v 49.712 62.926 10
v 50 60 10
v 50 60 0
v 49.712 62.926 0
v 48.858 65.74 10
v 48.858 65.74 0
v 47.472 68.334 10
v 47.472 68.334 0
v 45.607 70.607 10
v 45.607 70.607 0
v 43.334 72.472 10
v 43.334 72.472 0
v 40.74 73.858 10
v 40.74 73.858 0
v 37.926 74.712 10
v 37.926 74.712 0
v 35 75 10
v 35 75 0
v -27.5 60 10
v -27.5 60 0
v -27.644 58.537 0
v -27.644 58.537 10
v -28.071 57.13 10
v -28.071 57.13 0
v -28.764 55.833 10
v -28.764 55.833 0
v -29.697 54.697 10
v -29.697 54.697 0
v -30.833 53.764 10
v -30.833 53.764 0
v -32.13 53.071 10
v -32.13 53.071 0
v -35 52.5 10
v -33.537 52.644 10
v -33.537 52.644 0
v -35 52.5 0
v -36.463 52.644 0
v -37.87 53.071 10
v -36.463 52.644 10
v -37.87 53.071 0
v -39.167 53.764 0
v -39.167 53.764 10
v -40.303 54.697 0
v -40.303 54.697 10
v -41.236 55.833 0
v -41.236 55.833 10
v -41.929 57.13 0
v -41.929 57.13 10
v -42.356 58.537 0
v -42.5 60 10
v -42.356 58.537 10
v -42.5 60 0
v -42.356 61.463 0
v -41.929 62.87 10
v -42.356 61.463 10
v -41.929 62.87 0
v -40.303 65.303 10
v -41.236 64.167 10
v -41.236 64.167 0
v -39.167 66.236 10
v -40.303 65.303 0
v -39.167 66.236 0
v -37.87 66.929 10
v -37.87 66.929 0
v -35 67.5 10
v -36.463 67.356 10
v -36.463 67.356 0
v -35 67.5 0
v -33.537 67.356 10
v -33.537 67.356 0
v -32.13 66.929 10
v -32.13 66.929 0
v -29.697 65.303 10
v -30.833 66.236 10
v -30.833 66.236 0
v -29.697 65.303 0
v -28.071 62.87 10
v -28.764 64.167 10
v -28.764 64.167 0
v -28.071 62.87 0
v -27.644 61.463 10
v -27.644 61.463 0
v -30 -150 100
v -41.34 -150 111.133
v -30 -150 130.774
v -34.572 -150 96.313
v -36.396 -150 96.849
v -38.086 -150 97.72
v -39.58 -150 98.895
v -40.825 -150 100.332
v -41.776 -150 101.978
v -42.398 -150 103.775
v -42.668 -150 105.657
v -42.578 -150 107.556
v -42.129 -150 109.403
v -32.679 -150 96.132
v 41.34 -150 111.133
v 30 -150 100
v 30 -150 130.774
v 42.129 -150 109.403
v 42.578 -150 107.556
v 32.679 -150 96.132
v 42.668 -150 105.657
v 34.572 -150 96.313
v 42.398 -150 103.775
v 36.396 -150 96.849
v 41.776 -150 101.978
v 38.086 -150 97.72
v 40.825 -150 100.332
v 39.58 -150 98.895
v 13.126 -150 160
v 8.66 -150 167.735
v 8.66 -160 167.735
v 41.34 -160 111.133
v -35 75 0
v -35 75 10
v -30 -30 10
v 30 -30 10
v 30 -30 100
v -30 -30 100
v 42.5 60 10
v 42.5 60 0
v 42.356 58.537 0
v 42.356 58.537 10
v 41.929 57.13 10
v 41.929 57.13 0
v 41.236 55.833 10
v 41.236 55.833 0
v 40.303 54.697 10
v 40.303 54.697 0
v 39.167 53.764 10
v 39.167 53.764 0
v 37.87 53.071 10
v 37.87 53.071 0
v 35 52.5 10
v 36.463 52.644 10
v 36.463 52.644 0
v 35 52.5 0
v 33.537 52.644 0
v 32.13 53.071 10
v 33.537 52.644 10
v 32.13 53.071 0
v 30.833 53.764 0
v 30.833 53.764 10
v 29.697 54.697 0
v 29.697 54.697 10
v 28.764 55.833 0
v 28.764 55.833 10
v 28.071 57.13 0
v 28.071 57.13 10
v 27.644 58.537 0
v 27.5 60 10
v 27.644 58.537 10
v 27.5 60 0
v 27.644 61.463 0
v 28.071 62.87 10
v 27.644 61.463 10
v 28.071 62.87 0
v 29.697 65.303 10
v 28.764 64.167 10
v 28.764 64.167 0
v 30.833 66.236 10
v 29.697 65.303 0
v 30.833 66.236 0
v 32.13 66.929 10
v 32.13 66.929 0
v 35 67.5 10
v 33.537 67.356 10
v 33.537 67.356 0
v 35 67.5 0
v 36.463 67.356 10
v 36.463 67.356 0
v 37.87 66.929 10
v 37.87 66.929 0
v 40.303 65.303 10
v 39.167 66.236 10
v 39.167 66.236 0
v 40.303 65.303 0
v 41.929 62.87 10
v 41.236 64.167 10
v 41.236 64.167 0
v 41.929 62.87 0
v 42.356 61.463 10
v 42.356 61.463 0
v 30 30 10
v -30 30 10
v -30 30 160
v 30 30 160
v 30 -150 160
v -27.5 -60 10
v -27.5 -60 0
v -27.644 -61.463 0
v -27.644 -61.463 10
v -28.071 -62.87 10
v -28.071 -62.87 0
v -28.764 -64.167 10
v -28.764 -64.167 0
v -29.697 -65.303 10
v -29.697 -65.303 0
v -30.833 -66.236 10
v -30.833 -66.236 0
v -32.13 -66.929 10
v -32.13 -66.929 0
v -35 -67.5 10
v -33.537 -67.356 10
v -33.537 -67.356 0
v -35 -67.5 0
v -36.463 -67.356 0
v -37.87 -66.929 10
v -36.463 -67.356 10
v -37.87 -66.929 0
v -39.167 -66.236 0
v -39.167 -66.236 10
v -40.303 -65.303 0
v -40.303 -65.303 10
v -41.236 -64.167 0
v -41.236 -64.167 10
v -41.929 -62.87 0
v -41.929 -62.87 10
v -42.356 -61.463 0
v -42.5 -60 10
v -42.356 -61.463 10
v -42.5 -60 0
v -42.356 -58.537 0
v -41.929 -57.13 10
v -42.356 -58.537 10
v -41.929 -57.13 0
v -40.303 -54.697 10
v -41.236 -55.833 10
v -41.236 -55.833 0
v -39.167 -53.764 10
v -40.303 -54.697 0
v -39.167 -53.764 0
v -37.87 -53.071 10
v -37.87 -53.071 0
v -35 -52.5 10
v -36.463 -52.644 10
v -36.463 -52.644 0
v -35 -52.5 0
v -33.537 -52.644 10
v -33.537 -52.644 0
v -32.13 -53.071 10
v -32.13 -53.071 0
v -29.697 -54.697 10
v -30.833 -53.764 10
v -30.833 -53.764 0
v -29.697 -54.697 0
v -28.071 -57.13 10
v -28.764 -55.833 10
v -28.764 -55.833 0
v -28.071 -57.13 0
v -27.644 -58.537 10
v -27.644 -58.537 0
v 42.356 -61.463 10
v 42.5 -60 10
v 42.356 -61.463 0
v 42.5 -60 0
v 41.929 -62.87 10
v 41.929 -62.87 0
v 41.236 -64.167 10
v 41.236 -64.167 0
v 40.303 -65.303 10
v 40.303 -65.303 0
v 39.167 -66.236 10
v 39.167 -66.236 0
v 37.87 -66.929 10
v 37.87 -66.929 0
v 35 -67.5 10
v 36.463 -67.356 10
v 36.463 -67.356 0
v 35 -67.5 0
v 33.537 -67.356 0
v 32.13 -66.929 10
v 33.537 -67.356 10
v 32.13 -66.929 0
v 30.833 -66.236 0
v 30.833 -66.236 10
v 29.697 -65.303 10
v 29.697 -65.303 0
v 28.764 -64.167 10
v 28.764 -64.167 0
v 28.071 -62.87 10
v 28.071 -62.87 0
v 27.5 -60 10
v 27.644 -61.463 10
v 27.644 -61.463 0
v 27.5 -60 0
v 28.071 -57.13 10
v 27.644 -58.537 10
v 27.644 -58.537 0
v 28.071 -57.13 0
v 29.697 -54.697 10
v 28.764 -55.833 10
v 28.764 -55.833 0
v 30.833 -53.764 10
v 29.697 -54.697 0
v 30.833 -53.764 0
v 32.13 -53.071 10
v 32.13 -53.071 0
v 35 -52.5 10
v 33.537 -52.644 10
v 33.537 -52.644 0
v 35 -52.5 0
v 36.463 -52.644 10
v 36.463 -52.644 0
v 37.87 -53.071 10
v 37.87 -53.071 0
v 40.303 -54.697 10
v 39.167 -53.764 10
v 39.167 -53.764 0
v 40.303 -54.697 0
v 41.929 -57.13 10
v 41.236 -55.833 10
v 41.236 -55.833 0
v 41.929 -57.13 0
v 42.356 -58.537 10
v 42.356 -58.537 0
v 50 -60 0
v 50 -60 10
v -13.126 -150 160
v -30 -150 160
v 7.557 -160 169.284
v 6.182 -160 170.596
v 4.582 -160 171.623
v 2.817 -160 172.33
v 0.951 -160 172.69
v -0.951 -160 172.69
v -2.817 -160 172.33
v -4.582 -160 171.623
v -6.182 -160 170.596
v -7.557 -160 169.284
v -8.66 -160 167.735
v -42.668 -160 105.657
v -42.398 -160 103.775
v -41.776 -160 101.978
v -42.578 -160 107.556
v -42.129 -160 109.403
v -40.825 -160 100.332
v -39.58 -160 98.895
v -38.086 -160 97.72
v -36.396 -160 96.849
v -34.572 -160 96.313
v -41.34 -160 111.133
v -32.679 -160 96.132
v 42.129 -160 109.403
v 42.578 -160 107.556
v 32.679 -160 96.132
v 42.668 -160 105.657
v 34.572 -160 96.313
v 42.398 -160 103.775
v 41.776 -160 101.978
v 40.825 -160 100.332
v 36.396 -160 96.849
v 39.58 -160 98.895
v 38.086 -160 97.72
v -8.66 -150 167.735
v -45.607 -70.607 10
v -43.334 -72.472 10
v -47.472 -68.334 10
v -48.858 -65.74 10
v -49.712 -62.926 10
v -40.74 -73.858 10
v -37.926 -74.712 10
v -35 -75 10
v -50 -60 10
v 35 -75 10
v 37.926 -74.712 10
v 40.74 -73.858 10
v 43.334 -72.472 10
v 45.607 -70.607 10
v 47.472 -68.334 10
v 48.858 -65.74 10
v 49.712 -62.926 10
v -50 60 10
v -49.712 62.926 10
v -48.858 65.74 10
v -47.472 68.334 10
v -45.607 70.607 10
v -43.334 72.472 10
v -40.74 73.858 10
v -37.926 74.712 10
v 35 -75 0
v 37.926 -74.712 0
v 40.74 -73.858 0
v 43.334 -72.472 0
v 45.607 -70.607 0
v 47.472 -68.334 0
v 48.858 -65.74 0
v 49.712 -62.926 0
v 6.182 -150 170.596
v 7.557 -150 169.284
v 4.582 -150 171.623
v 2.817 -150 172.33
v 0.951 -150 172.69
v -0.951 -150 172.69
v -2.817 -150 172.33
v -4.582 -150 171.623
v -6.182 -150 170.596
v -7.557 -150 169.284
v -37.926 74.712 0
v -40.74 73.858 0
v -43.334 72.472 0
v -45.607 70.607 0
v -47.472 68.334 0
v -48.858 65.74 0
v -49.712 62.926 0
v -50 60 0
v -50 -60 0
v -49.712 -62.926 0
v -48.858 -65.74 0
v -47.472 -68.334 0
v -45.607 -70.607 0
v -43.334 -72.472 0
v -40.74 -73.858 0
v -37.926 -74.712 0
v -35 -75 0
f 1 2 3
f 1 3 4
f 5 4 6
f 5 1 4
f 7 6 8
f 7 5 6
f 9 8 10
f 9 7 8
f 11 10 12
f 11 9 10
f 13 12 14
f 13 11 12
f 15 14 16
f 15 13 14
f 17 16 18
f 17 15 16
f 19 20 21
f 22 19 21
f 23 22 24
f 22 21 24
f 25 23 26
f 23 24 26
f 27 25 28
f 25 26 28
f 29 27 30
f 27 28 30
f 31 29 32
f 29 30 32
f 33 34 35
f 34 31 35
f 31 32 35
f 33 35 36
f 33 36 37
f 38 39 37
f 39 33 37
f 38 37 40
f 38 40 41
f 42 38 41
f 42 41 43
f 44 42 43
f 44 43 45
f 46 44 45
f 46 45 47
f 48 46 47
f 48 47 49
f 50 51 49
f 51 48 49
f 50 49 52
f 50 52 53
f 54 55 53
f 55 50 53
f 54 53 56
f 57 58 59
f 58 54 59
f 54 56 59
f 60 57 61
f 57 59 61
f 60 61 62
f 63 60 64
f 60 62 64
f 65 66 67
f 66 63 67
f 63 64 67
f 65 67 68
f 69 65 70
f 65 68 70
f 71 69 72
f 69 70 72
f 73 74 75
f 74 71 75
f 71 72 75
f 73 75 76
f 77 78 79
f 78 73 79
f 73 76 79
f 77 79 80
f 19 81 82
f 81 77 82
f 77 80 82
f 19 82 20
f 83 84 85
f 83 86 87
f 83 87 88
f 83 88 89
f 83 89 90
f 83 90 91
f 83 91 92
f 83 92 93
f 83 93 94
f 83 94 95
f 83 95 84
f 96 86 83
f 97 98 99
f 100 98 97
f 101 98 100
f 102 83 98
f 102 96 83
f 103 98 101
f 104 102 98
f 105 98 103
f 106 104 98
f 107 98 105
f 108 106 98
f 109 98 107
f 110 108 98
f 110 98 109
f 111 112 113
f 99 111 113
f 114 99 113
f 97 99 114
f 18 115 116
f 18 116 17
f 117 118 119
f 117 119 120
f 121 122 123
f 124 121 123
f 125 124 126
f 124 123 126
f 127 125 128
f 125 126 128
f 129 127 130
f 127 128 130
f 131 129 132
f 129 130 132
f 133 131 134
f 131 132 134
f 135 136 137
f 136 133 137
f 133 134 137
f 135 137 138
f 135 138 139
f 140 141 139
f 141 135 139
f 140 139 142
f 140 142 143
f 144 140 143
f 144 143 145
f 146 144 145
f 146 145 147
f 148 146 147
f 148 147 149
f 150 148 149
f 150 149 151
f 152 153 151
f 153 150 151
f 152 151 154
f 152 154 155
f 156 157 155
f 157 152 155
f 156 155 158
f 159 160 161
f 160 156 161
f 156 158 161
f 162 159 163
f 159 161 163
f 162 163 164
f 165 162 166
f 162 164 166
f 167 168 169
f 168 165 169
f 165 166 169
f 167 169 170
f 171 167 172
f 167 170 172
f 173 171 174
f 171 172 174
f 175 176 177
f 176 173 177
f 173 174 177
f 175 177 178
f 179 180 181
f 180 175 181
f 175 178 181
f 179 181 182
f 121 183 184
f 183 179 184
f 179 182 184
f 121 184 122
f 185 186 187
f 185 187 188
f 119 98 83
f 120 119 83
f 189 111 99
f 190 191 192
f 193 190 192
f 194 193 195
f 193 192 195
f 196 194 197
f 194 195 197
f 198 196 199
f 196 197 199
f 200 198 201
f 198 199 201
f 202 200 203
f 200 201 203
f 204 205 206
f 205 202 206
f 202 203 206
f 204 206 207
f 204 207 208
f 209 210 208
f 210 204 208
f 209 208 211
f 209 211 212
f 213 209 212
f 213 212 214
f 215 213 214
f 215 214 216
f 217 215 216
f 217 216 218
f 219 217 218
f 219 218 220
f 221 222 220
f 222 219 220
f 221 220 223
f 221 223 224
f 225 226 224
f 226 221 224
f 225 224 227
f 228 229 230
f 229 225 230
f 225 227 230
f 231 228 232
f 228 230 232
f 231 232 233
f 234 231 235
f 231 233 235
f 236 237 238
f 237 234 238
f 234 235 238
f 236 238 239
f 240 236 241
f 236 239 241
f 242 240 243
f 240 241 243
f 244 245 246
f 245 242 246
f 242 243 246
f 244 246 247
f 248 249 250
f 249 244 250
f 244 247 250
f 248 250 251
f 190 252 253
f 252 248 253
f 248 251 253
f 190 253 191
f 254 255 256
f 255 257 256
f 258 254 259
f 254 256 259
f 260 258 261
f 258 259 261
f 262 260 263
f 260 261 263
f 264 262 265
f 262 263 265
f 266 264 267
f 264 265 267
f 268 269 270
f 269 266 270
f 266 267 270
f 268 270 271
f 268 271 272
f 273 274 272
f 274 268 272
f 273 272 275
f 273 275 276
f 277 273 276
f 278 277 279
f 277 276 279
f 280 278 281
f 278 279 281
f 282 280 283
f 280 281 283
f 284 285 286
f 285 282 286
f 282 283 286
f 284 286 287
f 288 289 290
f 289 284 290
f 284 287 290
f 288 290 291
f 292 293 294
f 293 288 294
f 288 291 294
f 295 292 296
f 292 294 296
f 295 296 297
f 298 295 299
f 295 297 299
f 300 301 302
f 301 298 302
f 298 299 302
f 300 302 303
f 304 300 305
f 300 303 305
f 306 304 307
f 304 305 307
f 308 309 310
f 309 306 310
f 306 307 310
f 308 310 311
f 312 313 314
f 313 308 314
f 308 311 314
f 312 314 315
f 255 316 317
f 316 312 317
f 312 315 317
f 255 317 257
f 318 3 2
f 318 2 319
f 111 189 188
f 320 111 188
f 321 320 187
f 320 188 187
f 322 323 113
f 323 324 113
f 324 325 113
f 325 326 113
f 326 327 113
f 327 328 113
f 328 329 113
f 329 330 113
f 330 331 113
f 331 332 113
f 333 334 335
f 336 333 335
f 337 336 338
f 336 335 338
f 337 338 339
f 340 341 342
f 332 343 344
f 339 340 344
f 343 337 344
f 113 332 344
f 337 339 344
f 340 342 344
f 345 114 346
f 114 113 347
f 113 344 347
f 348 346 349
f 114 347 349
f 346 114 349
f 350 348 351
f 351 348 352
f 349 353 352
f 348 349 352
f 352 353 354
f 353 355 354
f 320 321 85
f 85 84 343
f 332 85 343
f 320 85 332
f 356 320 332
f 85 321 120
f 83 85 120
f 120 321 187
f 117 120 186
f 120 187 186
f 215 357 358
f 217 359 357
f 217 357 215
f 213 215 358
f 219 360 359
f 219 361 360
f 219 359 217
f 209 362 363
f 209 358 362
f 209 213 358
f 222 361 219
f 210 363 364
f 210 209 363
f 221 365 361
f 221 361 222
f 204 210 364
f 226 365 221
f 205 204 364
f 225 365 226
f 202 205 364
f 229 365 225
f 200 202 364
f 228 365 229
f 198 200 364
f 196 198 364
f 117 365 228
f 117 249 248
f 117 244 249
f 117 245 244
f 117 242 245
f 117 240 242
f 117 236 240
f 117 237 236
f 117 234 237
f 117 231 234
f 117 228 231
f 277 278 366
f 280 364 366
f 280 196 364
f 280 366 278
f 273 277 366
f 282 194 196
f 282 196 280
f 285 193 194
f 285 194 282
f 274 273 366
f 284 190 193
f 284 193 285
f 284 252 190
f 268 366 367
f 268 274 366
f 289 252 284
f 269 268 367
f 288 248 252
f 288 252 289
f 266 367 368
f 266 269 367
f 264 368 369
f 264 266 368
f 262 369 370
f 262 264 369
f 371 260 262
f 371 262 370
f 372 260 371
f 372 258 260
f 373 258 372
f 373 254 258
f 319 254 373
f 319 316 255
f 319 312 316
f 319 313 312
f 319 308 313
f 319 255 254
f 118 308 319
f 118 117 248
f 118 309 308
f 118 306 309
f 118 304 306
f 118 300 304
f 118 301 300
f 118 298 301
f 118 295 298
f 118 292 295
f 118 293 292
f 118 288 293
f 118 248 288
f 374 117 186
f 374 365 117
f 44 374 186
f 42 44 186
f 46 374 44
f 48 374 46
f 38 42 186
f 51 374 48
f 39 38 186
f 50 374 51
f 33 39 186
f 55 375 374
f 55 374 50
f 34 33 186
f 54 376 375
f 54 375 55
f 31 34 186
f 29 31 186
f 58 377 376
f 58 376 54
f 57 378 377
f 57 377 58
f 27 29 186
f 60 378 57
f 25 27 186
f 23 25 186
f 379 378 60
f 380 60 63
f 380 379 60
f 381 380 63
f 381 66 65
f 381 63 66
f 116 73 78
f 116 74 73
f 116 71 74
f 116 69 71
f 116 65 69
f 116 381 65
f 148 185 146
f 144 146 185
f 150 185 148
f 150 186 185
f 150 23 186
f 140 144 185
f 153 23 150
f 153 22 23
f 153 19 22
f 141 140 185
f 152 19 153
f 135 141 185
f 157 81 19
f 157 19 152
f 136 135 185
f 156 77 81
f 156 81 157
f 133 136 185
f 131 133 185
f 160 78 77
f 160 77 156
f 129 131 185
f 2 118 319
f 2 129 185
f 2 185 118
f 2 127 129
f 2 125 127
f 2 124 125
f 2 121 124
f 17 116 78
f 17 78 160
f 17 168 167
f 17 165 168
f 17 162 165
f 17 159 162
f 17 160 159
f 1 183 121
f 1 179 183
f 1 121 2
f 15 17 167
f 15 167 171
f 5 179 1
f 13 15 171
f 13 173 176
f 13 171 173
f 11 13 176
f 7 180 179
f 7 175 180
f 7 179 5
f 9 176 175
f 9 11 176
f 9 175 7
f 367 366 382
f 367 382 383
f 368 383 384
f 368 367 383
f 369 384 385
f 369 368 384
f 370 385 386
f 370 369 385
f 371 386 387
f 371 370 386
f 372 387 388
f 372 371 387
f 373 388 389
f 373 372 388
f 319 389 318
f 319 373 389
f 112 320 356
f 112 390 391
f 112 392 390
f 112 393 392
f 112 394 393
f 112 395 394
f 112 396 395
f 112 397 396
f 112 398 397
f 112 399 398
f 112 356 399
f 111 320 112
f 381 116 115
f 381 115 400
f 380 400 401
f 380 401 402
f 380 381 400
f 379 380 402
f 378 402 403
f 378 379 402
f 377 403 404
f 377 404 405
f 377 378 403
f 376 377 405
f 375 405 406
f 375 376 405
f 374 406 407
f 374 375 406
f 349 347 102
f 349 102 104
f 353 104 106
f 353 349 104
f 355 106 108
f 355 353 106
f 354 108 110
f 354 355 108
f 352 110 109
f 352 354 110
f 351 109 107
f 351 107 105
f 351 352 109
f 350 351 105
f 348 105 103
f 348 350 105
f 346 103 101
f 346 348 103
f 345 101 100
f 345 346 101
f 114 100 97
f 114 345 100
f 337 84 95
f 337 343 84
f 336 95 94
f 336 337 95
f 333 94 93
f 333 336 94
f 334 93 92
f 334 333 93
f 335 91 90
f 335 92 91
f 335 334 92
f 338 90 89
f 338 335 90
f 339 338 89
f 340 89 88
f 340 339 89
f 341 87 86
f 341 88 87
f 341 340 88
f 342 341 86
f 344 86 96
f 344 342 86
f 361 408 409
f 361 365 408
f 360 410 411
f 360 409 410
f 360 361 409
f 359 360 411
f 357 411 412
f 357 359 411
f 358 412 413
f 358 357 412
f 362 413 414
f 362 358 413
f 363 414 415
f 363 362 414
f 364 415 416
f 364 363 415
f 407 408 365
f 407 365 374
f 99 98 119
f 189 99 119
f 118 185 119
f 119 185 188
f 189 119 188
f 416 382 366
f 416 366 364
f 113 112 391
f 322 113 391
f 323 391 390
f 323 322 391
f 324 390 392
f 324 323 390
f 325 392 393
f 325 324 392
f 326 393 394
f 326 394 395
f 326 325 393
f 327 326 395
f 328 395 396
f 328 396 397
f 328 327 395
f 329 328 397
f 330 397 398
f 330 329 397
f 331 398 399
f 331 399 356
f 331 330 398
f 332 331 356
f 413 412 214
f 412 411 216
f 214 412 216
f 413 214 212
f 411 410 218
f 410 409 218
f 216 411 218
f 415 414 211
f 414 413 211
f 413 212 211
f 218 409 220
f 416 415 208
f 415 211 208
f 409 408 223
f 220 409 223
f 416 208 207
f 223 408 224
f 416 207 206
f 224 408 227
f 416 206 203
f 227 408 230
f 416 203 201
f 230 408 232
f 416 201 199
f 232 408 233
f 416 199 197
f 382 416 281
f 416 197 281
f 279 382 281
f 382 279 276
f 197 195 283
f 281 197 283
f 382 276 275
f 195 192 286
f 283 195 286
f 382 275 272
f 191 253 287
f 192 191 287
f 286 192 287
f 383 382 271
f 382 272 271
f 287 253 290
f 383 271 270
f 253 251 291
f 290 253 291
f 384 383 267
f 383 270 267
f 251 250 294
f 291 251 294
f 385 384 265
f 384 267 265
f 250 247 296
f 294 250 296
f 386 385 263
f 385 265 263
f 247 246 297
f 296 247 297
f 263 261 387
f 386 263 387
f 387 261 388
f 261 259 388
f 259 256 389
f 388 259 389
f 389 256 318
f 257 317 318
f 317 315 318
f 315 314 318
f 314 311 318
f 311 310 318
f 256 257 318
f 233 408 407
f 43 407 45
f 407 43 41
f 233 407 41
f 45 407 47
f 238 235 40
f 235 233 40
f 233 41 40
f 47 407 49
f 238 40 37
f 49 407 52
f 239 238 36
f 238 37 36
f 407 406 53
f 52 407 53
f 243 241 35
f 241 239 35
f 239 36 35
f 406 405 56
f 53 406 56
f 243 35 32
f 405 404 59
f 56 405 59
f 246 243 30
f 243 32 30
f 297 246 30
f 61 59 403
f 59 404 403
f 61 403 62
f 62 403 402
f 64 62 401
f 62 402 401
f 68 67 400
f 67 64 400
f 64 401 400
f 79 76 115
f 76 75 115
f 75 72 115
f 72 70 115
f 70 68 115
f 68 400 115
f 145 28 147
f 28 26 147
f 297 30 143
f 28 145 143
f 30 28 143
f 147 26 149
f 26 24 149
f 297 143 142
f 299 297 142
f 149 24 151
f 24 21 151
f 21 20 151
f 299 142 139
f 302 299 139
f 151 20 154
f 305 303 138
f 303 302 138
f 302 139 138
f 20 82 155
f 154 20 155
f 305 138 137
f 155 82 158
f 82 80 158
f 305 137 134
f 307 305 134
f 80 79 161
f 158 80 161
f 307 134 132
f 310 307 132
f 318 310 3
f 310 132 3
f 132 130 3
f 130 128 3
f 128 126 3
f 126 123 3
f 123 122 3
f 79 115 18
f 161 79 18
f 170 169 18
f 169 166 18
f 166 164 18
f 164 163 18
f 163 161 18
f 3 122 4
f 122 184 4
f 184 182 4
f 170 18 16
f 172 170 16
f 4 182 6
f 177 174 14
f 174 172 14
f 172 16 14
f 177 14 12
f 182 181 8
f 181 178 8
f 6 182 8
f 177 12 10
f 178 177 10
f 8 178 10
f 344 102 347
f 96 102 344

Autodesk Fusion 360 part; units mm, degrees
sketch "Sketch1" plane through (0, 0, 0) normal (0, 0, 1) x (1, 0, 0) in component "Mounting Plate1"
  line L0 (-50, 75) -> (50, 75)
  line L1 (50, 75) -> (50, -75)
  line L2 (50, -75) -> (-50, -75)
  line L3 (-50, -75) -> (-50, 75)
  line L4 (-50, 75) -> (50, -75) construction
  line L5 (50, 75) -> (-50, -75) construction
  circle A0 centre (-35, 60) radius 7.5
  circle A1 centre (35, 60) radius 7.5
  line L6 (0, 0) -> (21.7934, 0) construction
  circle A2 centre (-35, -60) radius 7.5
  circle A3 centre (35, -60) radius 7.5
  dimension "d1" = 100
  dimension "d2" = 150
  dimension "d3" = 15
  dimension "d4" = 15
  dimension "d5" = 15
  dimension "d6" = 15
extrude "Extrude1" add sketch "Sketch1" along normal blind 10 makes body 1 in component "Mounting Plate1"
fillet "Fillet1" radius 15 4 edges at (-50, 75, 5) (50, 75, 5) (50, -75, 5) (-50, -75, 5) on bodies 1 in component "Mounting Plate1"
ref_plane "WorkPlane1" through (0, -150, 0) normal (0, 1, 0) x (0, 0, 1) in component "Mounting Plate1"
sketch "Sketch2" plane through (0, -150, 0) normal (0, 1, 0) x (1, 0, 0) in component "Mounting Plate1"
  line L0 (-35, -10) -> (35, -10)
  line L1 (0, 0) -> (0, -125) construction
  line L2 (-50, -96.1325) -> (0, -182.735)
  line L3 (0, -182.735) -> (50, -96.1325)
  line L4 (50, -96.1325) -> (-50, -96.1325)
  point P0 (0, -125)
  dimension "d11" = 125
  dimension "d12" = 100
extrude "Extrude2" add sketch "Sketch2" against normal blind 10 separate body makes body 2 in component "Mounting Plate1"
fillet "Fillet2" radius 10 3 edges at (0, -155, 182.735) (50, -155, 96.1325) (-50, -155, 96.1325) on bodies 2 in component "Mounting Plate1"
sketch "Sketch1 (2)" plane through (0, 0, 10) normal (0, 0, 1) x (1, 0, 0)
  arc A0 (-50, -60) -> (-35, -75) centre (-35, -60) ccw
  line L0 (-35, -75) -> (35, -75)
  arc A1 (35, -75) -> (50, -60) centre (35, -60) ccw
  line L1 (50, -60) -> (50, 60)
  arc A2 (50, 60) -> (35, 75) centre (35, 60) ccw
  line L2 (35, 75) -> (-35, 75)
  arc A3 (-35, 75) -> (-50, 60) centre (-35, 60) ccw
  line L3 (-50, 60) -> (-50, -60)
  circle A4 centre (35, -60) radius 7.5
  circle A5 centre (-35, 60) radius 7.5
  circle A6 centre (-35, -60) radius 7.5
  circle A7 centre (35, 60) radius 7.5
  line L4 (-30, 30) -> (30, 30)
  line L5 (30, 30) -> (30, -30)
  line L6 (30, -30) -> (-30, -30)
  line L7 (-30, -30) -> (-30, 30)
  line L8 (-30, 30) -> (30, -30) construction
  line L9 (30, 30) -> (-30, -30) construction
extrude "Extrude3" add sketch "Sketch1 (2)" along normal blind 150 contours L4 L5 L6 L7 bodies 1 in component "Mounting Plate1"
sketch "Sketch2 (2)" plane through (0, -30, 0) normal (0, -1, 0) x (1, 0, 0)
  line L0 (-30, 10) -> (30, 10)
  line L1 (30, 10) -> (30, 160)
  line L2 (30, 160) -> (-30, 160)
  line L3 (-30, 160) -> (-30, 10)
  line L4 (-30, 160) -> (30, 160)
  line L5 (30, 160) -> (30, 100)
  line L6 (30, 100) -> (-30, 100)
  line L7 (-30, 100) -> (-30, 160)
extrude "Extrude4" add sketch "Sketch2 (2)" along normal blind 120 contours L1 L2 L3 L4 L5 L6 L7 bodies 1 2 in component "Mounting Plate1"
component "Mounting Plate1" placed x (1, 0, 0) y (0, 1, 0) z (0, 0, 1) at (0, 0, 0)
equation "d2 = ( 6 * 25 ) * 1 mm"
